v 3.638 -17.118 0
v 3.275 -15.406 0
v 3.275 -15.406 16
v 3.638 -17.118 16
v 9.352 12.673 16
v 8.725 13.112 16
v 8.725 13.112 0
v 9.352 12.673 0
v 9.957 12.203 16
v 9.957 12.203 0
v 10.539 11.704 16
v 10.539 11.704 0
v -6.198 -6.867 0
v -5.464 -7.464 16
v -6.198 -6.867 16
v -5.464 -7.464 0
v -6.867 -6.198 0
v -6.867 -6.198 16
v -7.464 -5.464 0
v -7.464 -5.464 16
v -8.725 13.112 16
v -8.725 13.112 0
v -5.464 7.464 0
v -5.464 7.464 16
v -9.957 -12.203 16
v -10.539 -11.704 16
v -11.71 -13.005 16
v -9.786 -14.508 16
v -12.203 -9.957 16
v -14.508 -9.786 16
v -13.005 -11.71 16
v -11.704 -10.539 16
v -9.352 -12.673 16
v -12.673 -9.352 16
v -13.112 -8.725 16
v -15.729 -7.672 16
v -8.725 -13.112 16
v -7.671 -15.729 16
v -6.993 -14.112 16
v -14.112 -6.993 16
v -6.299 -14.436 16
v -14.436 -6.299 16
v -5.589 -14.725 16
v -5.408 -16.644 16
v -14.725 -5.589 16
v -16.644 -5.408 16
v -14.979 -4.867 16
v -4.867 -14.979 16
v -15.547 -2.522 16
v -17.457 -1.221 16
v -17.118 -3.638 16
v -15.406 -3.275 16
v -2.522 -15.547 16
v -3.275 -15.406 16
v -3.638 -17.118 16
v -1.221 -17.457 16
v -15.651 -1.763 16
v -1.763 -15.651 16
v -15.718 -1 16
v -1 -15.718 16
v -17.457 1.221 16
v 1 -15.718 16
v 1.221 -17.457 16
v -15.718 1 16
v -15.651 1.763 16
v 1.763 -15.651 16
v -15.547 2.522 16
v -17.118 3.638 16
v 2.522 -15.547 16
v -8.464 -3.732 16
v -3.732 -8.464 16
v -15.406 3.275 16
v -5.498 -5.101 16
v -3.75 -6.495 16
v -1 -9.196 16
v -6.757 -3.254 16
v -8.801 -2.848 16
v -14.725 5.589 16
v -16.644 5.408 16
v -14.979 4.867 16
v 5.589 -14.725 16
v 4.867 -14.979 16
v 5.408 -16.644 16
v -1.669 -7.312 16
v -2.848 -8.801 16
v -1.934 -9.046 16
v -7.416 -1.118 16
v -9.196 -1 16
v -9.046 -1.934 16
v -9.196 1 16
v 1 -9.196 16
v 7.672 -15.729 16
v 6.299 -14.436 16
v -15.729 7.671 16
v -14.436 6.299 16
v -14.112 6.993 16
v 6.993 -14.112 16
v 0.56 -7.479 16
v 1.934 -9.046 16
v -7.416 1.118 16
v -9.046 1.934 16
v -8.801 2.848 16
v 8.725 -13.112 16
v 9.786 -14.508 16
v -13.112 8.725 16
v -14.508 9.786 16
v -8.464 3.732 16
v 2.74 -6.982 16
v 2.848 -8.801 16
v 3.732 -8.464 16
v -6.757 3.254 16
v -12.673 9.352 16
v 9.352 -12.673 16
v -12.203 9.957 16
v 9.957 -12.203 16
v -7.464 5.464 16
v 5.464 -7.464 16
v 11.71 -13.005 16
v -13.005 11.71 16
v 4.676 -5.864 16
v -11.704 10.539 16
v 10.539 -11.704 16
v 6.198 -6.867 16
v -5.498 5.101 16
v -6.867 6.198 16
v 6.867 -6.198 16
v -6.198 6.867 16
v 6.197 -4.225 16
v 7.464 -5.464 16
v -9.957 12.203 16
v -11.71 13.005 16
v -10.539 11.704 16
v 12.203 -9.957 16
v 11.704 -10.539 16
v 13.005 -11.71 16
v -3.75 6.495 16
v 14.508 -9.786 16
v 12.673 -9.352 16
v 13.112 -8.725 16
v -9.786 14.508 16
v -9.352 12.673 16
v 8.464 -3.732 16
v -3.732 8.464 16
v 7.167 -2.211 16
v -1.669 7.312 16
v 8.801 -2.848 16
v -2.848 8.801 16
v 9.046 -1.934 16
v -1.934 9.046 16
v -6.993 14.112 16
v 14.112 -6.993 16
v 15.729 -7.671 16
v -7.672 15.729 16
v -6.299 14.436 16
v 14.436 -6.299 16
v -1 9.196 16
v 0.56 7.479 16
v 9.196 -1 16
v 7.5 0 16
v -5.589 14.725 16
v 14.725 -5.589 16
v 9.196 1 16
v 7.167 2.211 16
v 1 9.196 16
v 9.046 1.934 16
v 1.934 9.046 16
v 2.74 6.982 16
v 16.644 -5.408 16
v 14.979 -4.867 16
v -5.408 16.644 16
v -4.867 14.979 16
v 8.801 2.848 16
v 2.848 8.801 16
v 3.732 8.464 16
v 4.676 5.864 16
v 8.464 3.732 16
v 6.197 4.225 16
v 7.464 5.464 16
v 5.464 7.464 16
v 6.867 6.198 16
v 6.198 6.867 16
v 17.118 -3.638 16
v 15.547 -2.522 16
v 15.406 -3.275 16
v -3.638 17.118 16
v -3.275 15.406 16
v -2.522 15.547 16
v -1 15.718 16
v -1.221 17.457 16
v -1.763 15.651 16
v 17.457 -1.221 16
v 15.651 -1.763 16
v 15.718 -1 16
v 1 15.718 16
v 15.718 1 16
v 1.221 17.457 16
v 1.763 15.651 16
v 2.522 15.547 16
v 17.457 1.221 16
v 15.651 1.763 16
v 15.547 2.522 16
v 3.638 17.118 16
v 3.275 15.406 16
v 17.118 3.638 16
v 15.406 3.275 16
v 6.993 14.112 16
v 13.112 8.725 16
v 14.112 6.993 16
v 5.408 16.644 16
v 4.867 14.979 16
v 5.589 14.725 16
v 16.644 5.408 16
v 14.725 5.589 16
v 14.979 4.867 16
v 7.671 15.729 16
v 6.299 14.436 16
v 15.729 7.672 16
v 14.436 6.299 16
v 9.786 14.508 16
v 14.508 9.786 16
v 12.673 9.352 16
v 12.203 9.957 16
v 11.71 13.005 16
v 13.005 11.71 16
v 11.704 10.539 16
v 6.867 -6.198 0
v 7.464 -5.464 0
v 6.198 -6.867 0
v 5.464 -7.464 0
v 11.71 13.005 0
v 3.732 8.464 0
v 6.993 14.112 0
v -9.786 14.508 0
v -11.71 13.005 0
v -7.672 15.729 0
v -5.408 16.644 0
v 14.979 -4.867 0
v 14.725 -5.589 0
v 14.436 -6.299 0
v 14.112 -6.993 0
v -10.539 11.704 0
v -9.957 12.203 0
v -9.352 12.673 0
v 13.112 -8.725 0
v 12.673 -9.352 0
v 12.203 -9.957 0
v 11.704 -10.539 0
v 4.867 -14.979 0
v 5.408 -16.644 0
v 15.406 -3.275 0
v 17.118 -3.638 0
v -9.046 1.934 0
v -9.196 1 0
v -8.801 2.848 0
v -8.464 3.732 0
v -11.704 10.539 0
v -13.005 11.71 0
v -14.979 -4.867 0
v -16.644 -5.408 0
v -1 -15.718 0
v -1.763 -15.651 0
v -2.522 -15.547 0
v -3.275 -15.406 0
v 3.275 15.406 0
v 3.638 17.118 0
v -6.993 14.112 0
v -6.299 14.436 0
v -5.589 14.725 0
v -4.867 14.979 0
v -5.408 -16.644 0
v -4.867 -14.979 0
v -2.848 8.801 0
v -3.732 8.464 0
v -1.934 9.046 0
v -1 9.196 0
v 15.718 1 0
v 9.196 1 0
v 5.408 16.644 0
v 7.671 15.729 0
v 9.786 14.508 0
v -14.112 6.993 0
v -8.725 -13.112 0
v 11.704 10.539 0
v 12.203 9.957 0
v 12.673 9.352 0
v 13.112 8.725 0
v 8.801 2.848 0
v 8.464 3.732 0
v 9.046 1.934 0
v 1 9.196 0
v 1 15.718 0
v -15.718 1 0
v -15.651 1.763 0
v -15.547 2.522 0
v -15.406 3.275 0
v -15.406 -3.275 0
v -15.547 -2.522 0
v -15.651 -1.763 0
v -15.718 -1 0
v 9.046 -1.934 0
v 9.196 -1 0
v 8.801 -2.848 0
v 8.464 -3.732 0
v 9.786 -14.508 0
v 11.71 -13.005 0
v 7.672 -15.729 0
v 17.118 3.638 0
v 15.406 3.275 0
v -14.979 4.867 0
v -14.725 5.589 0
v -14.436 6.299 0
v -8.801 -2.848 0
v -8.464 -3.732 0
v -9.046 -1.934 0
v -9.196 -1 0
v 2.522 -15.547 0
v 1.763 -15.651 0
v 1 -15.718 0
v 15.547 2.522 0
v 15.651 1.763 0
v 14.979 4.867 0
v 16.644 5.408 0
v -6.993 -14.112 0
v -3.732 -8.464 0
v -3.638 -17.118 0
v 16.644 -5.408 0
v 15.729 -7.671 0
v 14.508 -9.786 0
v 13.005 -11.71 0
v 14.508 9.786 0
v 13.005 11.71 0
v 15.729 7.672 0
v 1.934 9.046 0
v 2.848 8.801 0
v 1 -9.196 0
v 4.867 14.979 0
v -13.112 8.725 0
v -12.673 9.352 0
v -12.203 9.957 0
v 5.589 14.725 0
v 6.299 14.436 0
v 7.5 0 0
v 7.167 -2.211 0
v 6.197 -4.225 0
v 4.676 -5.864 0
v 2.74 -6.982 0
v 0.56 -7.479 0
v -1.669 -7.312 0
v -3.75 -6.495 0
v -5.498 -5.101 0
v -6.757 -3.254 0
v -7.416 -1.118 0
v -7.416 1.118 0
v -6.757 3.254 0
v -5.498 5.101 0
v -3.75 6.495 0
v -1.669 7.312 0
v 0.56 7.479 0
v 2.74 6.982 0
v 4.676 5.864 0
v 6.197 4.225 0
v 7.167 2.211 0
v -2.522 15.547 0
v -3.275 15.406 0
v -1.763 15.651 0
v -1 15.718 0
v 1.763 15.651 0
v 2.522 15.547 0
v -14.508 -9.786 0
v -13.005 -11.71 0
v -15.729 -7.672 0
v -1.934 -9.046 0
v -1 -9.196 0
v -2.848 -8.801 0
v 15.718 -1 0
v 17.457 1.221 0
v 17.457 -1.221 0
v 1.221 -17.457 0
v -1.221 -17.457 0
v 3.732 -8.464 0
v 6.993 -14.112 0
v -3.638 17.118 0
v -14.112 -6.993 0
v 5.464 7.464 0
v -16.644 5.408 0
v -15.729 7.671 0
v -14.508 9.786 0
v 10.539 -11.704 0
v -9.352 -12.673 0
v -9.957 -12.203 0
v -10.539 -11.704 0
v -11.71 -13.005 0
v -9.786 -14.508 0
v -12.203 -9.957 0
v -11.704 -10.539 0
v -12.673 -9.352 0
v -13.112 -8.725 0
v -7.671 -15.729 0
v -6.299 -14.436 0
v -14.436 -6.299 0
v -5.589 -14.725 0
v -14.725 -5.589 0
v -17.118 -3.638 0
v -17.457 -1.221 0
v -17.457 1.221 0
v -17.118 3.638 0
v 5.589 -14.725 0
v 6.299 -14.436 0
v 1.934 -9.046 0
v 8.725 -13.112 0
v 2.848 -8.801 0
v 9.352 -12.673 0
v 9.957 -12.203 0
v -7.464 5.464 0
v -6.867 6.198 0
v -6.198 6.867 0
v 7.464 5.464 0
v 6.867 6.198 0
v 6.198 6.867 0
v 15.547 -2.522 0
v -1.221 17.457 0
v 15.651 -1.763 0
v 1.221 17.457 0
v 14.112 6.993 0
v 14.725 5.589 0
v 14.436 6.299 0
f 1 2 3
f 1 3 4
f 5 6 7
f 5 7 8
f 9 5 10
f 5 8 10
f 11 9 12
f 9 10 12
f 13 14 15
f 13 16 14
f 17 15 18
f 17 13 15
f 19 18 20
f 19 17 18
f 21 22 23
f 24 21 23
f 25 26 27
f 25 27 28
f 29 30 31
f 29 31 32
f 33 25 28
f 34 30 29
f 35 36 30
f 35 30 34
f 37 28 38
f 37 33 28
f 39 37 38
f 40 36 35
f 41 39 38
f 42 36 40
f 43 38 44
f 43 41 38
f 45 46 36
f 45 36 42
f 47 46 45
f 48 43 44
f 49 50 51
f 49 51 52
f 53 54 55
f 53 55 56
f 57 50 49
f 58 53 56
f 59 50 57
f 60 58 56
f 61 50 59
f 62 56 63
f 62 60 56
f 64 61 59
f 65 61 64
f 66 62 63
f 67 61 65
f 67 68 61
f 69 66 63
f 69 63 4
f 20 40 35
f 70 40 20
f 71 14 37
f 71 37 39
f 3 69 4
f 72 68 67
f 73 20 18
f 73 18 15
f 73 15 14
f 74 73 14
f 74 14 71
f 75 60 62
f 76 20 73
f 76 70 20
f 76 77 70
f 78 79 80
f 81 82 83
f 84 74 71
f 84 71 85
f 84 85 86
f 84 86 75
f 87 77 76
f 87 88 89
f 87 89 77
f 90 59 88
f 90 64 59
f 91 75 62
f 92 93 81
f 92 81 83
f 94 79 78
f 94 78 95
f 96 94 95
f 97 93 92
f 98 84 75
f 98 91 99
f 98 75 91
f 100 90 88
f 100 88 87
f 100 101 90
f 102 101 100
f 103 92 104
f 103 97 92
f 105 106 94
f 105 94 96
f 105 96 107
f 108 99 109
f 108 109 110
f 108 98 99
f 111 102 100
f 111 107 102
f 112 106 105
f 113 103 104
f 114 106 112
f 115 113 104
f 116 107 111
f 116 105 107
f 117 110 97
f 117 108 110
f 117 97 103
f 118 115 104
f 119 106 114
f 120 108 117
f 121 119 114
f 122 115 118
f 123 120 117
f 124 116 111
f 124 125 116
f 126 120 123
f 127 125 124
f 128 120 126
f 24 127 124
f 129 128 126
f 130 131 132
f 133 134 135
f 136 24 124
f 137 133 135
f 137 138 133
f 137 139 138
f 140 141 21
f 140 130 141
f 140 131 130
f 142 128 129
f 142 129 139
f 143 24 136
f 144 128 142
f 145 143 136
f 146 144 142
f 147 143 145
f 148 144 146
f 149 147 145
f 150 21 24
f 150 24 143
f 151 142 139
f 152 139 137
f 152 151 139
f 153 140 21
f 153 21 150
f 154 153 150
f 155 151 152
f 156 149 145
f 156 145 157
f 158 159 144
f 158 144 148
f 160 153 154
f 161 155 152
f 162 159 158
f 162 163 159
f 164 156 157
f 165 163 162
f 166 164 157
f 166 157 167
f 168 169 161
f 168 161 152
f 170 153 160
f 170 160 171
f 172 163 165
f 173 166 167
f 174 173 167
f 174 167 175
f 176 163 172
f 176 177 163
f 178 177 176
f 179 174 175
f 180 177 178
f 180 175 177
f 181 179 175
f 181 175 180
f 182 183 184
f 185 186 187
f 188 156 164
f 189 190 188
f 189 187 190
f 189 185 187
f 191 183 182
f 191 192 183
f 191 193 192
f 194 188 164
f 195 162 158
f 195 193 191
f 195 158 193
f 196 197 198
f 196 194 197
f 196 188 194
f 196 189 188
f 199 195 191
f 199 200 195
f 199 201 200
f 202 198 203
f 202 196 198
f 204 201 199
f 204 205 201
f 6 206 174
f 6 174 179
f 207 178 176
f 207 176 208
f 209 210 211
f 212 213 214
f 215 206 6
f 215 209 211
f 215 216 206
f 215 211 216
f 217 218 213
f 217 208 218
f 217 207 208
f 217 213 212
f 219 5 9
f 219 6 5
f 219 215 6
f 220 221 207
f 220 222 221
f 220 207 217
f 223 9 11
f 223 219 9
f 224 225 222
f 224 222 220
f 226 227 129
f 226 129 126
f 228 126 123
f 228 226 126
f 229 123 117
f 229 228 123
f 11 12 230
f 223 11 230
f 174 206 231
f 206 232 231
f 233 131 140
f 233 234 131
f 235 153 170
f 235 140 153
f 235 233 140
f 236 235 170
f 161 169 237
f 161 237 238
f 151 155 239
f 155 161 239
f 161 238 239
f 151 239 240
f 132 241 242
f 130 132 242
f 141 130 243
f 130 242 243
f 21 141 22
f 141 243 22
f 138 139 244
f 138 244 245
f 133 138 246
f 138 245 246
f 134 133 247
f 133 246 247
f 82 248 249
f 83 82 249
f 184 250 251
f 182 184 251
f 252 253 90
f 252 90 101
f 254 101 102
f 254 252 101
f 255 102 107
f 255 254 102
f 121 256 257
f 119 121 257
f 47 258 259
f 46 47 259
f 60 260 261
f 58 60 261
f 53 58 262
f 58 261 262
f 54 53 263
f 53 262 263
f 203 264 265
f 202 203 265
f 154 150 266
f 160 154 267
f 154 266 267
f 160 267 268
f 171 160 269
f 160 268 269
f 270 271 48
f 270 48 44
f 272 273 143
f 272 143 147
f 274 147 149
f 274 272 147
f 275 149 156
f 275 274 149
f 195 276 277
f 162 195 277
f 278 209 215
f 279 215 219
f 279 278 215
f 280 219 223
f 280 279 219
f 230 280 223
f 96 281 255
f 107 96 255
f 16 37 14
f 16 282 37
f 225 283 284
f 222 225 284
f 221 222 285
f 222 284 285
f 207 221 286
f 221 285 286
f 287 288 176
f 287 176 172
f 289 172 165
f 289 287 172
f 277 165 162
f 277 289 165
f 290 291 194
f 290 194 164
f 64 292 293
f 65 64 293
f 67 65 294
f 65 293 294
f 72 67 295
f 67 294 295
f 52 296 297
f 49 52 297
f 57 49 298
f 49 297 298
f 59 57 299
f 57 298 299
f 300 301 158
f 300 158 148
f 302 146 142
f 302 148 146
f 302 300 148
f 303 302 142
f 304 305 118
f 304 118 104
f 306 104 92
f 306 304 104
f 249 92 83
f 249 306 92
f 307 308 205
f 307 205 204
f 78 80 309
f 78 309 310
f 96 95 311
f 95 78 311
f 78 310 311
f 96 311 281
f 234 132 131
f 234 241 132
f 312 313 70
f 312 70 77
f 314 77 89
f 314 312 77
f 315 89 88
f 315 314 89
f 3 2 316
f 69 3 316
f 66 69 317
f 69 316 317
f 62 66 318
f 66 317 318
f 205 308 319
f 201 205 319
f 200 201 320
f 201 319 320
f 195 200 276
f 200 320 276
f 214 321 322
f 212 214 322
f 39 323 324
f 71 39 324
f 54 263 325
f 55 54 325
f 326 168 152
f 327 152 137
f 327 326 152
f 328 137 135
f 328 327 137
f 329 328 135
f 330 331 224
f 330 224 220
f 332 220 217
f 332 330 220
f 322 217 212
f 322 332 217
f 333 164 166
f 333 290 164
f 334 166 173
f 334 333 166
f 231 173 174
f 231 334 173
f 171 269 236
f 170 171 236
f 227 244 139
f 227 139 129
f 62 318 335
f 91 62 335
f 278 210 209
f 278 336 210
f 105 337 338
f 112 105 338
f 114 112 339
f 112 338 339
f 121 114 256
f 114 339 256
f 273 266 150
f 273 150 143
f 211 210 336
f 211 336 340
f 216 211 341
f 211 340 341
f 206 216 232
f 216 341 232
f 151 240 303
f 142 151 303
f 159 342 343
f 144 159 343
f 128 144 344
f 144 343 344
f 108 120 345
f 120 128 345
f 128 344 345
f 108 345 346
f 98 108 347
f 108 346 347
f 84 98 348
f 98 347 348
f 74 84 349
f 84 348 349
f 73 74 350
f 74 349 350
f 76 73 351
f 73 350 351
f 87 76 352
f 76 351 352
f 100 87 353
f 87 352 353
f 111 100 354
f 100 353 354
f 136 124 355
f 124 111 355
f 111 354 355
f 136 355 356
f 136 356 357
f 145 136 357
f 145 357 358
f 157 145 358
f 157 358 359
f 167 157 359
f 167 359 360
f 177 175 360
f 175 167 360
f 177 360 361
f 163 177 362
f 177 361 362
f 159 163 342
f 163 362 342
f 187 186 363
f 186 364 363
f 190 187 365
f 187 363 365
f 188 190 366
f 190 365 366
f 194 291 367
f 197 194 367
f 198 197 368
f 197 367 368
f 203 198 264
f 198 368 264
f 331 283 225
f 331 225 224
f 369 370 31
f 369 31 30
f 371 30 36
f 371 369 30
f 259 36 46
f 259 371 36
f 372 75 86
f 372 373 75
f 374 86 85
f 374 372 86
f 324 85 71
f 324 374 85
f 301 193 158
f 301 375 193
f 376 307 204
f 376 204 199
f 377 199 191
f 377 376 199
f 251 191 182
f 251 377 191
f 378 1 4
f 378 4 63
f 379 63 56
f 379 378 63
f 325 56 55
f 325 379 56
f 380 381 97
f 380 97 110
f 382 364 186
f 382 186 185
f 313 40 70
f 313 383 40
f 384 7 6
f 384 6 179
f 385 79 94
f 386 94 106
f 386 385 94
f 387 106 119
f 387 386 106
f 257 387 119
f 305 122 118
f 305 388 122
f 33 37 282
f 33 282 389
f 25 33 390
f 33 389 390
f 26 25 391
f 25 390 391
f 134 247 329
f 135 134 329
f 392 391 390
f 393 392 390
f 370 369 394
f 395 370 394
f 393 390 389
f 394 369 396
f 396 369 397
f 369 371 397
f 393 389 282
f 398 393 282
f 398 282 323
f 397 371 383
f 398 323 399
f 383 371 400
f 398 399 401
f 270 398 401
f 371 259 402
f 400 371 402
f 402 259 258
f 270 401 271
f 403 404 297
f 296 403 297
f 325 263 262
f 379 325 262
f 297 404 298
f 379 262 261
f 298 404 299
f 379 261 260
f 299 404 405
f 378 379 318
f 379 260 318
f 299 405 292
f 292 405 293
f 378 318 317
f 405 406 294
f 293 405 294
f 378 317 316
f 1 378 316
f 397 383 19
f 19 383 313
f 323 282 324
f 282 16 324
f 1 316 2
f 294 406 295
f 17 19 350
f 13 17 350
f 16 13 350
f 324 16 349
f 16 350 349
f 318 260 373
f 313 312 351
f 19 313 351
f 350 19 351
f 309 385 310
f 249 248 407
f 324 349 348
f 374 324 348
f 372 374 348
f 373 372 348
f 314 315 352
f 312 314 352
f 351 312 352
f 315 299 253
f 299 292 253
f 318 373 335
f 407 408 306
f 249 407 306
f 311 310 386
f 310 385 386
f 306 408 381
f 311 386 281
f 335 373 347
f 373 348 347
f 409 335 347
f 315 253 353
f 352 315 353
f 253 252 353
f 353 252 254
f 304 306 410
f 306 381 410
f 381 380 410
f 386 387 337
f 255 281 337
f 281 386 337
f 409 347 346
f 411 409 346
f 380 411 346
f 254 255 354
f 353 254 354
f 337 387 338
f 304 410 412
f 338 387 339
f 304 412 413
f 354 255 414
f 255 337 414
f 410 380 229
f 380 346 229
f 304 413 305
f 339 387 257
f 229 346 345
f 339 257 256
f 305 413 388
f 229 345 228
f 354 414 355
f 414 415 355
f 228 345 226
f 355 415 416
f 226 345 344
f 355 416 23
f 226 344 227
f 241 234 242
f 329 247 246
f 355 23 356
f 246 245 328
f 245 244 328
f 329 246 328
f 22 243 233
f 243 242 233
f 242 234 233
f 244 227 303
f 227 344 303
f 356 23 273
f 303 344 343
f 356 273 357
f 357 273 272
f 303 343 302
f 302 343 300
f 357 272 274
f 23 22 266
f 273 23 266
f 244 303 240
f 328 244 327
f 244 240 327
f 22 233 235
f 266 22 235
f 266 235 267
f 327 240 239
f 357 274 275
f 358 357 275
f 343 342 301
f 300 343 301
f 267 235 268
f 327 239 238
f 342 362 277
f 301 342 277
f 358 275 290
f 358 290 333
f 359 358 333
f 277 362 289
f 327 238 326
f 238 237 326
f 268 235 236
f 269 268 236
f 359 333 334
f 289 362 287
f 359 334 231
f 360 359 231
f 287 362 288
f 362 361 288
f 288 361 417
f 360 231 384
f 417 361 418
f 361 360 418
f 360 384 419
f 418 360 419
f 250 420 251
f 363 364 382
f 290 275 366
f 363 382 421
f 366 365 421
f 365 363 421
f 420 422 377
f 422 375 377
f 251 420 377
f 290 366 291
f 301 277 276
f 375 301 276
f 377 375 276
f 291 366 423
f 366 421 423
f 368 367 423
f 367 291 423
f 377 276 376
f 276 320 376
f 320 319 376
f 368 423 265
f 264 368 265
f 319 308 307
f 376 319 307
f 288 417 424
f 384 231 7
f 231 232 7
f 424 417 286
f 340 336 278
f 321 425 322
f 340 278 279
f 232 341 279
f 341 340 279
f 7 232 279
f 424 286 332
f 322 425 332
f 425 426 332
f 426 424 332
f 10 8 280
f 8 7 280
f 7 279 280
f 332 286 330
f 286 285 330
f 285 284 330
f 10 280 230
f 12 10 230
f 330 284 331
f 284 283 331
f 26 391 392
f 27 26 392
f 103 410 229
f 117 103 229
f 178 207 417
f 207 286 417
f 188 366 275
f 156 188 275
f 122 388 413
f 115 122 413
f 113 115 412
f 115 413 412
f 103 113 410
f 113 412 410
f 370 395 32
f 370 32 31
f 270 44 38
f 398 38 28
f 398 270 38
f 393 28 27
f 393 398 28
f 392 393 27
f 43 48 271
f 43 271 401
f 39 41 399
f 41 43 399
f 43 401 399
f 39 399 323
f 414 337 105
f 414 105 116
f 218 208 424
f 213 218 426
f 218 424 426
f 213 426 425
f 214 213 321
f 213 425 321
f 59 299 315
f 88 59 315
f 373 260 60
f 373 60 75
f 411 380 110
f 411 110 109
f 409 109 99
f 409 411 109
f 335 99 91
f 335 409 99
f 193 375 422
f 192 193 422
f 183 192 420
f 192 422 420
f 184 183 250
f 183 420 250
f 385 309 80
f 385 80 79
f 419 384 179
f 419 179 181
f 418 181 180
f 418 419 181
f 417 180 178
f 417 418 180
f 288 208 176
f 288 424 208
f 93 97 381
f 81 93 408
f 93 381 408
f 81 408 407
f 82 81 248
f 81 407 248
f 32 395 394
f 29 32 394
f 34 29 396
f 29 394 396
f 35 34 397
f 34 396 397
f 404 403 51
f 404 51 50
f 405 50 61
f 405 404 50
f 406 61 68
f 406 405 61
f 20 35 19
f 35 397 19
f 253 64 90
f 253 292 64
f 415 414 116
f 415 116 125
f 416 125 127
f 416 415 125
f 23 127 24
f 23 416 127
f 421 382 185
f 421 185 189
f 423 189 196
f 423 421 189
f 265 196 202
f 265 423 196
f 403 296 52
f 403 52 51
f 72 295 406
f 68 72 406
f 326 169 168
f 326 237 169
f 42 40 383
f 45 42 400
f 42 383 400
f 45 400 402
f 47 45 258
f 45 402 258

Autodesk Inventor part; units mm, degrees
ref_plane "YZ Plane" through (0, 0, 0) normal (1, 0, 0) x (0, 1, 0)
ref_plane "XZ Plane" through (0, 0, 0) normal (0, 1, 0) x (-1, 0, 0)
ref_plane "XY Plane" through (0, 0, 0) normal (0, 0, 1) x (1, 0, 0)
sketch "Sketch1" plane through (0, 0, 0) normal (0, 0, 1) x (1, 0, 0)
  arc A0 (-17.1176, 3.6385) -> (-17.1176, -3.6385) centre (0, 0) ccw
  circle A1 centre (0, 0) radius 7.5
  arc A2 (-15.4058, 3.2746) -> (-15.4058, -3.2746) centre (0, 0) ccw
  circle A3 centre (0, 0) radius 9.25
  line L0 (0, 0) -> (-17.5, 0) construction
  line L1 (-15.7182, -1) -> (-9.1958, -1)
  line L2 (-15.7182, 1) -> (-9.1958, 1)
  line L3 (-15.4058, 3.2746) -> (-17.1176, 3.6385)
  line L4 (-15.4058, -3.2746) -> (-17.1176, -3.6385)
  line L5 (0, 0) -> (-17.1176, 3.6385) construction
  arc A4 (-16.6435, -5.4078) -> (-13.005, -11.7098) centre (0, 0) ccw
  arc A5 (-14.9791, -4.867) -> (-11.7045, -10.5388) centre (0, 0) ccw
  line L6 (-13.1124, -8.7251) -> (-7.4638, -5.4639)
  line L7 (-14.1124, -6.9931) -> (-8.4638, -3.7319)
  line L8 (-14.9791, -4.867) -> (-16.6435, -5.4078)
  line L9 (-11.7045, -10.5388) -> (-13.005, -11.7098)
  arc A6 (-11.7098, -13.005) -> (-5.4078, -16.6435) centre (0, 0) ccw
  arc A7 (-10.5388, -11.7045) -> (-4.867, -14.9791) centre (0, 0) ccw
  line L10 (-6.9931, -14.1124) -> (-3.7319, -8.4638)
  line L11 (-8.7251, -13.1124) -> (-5.4639, -7.4638)
  line L12 (-10.5388, -11.7045) -> (-11.7098, -13.005)
  line L13 (-4.867, -14.9791) -> (-5.4078, -16.6435)
  arc A8 (-3.6385, -17.1176) -> (3.6385, -17.1176) centre (0, 0) ccw
  arc A9 (-3.2746, -15.4058) -> (3.2746, -15.4058) centre (0, 0) ccw
  line L14 (1, -15.7182) -> (1, -9.1958)
  line L15 (-1, -15.7182) -> (-1, -9.1958)
  line L16 (-3.2746, -15.4058) -> (-3.6385, -17.1176)
  line L17 (3.2746, -15.4058) -> (3.6385, -17.1176)
  arc A10 (5.4078, -16.6435) -> (11.7098, -13.005) centre (0, 0) ccw
  arc A11 (4.867, -14.9791) -> (10.5388, -11.7045) centre (0, 0) ccw
  line L18 (8.7251, -13.1124) -> (5.4639, -7.4638)
  line L19 (6.9931, -14.1124) -> (3.7319, -8.4638)
  line L20 (4.867, -14.9791) -> (5.4078, -16.6435)
  line L21 (10.5388, -11.7045) -> (11.7098, -13.005)
  arc A12 (13.005, -11.7098) -> (16.6435, -5.4078) centre (0, 0) ccw
  arc A13 (11.7045, -10.5388) -> (14.9791, -4.867) centre (0, 0) ccw
  line L22 (14.1124, -6.9931) -> (8.4638, -3.7319)
  line L23 (13.1124, -8.7251) -> (7.4638, -5.4639)
  line L24 (11.7045, -10.5388) -> (13.005, -11.7098)
  line L25 (14.9791, -4.867) -> (16.6435, -5.4078)
  arc A14 (17.1176, -3.6385) -> (17.1176, 3.6385) centre (0, 0) ccw
  arc A15 (15.4058, -3.2746) -> (15.4058, 3.2746) centre (0, 0) ccw
  line L26 (15.7182, 1) -> (9.1958, 1)
  line L27 (15.7182, -1) -> (9.1958, -1)
  line L28 (15.4058, -3.2746) -> (17.1176, -3.6385)
  line L29 (15.4058, 3.2746) -> (17.1176, 3.6385)
  arc A16 (16.6435, 5.4078) -> (13.005, 11.7098) centre (0, 0) ccw
  arc A17 (14.9791, 4.867) -> (11.7045, 10.5388) centre (0, 0) ccw
  line L30 (13.1124, 8.7251) -> (7.4638, 5.4639)
  line L31 (14.1124, 6.9931) -> (8.4638, 3.7319)
  line L32 (14.9791, 4.867) -> (16.6435, 5.4078)
  line L33 (11.7045, 10.5388) -> (13.005, 11.7098)
  arc A18 (11.7098, 13.005) -> (5.4078, 16.6435) centre (0, 0) ccw
  arc A19 (10.5388, 11.7045) -> (4.867, 14.9791) centre (0, 0) ccw
  line L34 (6.9931, 14.1124) -> (3.7319, 8.4638)
  line L35 (8.7251, 13.1124) -> (5.4639, 7.4638)
  line L36 (10.5388, 11.7045) -> (11.7098, 13.005)
  line L37 (4.867, 14.9791) -> (5.4078, 16.6435)
  arc A20 (3.6385, 17.1176) -> (-3.6385, 17.1176) centre (0, 0) ccw
  arc A21 (3.2746, 15.4058) -> (-3.2746, 15.4058) centre (0, 0) ccw
  line L38 (-1, 15.7182) -> (-1, 9.1958)
  line L39 (1, 15.7182) -> (1, 9.1958)
  line L40 (3.2746, 15.4058) -> (3.6385, 17.1176)
  line L41 (-3.2746, 15.4058) -> (-3.6385, 17.1176)
  arc A22 (-5.4078, 16.6435) -> (-11.7098, 13.005) centre (0, 0) ccw
  arc A23 (-4.867, 14.9791) -> (-10.5388, 11.7045) centre (0, 0) ccw
  line L42 (-8.7251, 13.1124) -> (-5.4639, 7.4638)
  line L43 (-6.9931, 14.1124) -> (-3.7319, 8.4638)
  line L44 (-4.867, 14.9791) -> (-5.4078, 16.6435)
  line L45 (-10.5388, 11.7045) -> (-11.7098, 13.005)
  arc A24 (-13.005, 11.7098) -> (-16.6435, 5.4078) centre (0, 0) ccw
  arc A25 (-11.7045, 10.5388) -> (-14.9791, 4.867) centre (0, 0) ccw
  line L46 (-14.1124, 6.9931) -> (-8.4638, 3.7319)
  line L47 (-13.1124, 8.7251) -> (-7.4638, 5.4639)
  line L48 (-11.7045, 10.5388) -> (-13.005, 11.7098)
  line L49 (-14.9791, 4.867) -> (-16.6435, 5.4078)
  point P0 (-15.1554, -8.75)
  point P1 (-8.75, -15.1554)
  point P2 (0, -17.5)
  point P3 (8.75, -15.1554)
  point P4 (15.1554, -8.75)
  point P5 (17.5, 0)
  point P6 (15.1554, 8.75)
  point P7 (8.75, 15.1554)
  point P8 (0, 17.5)
  point P9 (-8.75, 15.1554)
  point P10 (-15.1554, 8.75)
  dimension "d0" = 35
  dimension "d1" = 15
  dimension "d2" = 1.75
  dimension "d3" = 1.75
  dimension "d6" = 1
  dimension "d7" = 12
  dimension "d10" = 360
extrude "Extrusion1" add sketch "Sketch1" along normal blind 16
properties part number "STATOR"
